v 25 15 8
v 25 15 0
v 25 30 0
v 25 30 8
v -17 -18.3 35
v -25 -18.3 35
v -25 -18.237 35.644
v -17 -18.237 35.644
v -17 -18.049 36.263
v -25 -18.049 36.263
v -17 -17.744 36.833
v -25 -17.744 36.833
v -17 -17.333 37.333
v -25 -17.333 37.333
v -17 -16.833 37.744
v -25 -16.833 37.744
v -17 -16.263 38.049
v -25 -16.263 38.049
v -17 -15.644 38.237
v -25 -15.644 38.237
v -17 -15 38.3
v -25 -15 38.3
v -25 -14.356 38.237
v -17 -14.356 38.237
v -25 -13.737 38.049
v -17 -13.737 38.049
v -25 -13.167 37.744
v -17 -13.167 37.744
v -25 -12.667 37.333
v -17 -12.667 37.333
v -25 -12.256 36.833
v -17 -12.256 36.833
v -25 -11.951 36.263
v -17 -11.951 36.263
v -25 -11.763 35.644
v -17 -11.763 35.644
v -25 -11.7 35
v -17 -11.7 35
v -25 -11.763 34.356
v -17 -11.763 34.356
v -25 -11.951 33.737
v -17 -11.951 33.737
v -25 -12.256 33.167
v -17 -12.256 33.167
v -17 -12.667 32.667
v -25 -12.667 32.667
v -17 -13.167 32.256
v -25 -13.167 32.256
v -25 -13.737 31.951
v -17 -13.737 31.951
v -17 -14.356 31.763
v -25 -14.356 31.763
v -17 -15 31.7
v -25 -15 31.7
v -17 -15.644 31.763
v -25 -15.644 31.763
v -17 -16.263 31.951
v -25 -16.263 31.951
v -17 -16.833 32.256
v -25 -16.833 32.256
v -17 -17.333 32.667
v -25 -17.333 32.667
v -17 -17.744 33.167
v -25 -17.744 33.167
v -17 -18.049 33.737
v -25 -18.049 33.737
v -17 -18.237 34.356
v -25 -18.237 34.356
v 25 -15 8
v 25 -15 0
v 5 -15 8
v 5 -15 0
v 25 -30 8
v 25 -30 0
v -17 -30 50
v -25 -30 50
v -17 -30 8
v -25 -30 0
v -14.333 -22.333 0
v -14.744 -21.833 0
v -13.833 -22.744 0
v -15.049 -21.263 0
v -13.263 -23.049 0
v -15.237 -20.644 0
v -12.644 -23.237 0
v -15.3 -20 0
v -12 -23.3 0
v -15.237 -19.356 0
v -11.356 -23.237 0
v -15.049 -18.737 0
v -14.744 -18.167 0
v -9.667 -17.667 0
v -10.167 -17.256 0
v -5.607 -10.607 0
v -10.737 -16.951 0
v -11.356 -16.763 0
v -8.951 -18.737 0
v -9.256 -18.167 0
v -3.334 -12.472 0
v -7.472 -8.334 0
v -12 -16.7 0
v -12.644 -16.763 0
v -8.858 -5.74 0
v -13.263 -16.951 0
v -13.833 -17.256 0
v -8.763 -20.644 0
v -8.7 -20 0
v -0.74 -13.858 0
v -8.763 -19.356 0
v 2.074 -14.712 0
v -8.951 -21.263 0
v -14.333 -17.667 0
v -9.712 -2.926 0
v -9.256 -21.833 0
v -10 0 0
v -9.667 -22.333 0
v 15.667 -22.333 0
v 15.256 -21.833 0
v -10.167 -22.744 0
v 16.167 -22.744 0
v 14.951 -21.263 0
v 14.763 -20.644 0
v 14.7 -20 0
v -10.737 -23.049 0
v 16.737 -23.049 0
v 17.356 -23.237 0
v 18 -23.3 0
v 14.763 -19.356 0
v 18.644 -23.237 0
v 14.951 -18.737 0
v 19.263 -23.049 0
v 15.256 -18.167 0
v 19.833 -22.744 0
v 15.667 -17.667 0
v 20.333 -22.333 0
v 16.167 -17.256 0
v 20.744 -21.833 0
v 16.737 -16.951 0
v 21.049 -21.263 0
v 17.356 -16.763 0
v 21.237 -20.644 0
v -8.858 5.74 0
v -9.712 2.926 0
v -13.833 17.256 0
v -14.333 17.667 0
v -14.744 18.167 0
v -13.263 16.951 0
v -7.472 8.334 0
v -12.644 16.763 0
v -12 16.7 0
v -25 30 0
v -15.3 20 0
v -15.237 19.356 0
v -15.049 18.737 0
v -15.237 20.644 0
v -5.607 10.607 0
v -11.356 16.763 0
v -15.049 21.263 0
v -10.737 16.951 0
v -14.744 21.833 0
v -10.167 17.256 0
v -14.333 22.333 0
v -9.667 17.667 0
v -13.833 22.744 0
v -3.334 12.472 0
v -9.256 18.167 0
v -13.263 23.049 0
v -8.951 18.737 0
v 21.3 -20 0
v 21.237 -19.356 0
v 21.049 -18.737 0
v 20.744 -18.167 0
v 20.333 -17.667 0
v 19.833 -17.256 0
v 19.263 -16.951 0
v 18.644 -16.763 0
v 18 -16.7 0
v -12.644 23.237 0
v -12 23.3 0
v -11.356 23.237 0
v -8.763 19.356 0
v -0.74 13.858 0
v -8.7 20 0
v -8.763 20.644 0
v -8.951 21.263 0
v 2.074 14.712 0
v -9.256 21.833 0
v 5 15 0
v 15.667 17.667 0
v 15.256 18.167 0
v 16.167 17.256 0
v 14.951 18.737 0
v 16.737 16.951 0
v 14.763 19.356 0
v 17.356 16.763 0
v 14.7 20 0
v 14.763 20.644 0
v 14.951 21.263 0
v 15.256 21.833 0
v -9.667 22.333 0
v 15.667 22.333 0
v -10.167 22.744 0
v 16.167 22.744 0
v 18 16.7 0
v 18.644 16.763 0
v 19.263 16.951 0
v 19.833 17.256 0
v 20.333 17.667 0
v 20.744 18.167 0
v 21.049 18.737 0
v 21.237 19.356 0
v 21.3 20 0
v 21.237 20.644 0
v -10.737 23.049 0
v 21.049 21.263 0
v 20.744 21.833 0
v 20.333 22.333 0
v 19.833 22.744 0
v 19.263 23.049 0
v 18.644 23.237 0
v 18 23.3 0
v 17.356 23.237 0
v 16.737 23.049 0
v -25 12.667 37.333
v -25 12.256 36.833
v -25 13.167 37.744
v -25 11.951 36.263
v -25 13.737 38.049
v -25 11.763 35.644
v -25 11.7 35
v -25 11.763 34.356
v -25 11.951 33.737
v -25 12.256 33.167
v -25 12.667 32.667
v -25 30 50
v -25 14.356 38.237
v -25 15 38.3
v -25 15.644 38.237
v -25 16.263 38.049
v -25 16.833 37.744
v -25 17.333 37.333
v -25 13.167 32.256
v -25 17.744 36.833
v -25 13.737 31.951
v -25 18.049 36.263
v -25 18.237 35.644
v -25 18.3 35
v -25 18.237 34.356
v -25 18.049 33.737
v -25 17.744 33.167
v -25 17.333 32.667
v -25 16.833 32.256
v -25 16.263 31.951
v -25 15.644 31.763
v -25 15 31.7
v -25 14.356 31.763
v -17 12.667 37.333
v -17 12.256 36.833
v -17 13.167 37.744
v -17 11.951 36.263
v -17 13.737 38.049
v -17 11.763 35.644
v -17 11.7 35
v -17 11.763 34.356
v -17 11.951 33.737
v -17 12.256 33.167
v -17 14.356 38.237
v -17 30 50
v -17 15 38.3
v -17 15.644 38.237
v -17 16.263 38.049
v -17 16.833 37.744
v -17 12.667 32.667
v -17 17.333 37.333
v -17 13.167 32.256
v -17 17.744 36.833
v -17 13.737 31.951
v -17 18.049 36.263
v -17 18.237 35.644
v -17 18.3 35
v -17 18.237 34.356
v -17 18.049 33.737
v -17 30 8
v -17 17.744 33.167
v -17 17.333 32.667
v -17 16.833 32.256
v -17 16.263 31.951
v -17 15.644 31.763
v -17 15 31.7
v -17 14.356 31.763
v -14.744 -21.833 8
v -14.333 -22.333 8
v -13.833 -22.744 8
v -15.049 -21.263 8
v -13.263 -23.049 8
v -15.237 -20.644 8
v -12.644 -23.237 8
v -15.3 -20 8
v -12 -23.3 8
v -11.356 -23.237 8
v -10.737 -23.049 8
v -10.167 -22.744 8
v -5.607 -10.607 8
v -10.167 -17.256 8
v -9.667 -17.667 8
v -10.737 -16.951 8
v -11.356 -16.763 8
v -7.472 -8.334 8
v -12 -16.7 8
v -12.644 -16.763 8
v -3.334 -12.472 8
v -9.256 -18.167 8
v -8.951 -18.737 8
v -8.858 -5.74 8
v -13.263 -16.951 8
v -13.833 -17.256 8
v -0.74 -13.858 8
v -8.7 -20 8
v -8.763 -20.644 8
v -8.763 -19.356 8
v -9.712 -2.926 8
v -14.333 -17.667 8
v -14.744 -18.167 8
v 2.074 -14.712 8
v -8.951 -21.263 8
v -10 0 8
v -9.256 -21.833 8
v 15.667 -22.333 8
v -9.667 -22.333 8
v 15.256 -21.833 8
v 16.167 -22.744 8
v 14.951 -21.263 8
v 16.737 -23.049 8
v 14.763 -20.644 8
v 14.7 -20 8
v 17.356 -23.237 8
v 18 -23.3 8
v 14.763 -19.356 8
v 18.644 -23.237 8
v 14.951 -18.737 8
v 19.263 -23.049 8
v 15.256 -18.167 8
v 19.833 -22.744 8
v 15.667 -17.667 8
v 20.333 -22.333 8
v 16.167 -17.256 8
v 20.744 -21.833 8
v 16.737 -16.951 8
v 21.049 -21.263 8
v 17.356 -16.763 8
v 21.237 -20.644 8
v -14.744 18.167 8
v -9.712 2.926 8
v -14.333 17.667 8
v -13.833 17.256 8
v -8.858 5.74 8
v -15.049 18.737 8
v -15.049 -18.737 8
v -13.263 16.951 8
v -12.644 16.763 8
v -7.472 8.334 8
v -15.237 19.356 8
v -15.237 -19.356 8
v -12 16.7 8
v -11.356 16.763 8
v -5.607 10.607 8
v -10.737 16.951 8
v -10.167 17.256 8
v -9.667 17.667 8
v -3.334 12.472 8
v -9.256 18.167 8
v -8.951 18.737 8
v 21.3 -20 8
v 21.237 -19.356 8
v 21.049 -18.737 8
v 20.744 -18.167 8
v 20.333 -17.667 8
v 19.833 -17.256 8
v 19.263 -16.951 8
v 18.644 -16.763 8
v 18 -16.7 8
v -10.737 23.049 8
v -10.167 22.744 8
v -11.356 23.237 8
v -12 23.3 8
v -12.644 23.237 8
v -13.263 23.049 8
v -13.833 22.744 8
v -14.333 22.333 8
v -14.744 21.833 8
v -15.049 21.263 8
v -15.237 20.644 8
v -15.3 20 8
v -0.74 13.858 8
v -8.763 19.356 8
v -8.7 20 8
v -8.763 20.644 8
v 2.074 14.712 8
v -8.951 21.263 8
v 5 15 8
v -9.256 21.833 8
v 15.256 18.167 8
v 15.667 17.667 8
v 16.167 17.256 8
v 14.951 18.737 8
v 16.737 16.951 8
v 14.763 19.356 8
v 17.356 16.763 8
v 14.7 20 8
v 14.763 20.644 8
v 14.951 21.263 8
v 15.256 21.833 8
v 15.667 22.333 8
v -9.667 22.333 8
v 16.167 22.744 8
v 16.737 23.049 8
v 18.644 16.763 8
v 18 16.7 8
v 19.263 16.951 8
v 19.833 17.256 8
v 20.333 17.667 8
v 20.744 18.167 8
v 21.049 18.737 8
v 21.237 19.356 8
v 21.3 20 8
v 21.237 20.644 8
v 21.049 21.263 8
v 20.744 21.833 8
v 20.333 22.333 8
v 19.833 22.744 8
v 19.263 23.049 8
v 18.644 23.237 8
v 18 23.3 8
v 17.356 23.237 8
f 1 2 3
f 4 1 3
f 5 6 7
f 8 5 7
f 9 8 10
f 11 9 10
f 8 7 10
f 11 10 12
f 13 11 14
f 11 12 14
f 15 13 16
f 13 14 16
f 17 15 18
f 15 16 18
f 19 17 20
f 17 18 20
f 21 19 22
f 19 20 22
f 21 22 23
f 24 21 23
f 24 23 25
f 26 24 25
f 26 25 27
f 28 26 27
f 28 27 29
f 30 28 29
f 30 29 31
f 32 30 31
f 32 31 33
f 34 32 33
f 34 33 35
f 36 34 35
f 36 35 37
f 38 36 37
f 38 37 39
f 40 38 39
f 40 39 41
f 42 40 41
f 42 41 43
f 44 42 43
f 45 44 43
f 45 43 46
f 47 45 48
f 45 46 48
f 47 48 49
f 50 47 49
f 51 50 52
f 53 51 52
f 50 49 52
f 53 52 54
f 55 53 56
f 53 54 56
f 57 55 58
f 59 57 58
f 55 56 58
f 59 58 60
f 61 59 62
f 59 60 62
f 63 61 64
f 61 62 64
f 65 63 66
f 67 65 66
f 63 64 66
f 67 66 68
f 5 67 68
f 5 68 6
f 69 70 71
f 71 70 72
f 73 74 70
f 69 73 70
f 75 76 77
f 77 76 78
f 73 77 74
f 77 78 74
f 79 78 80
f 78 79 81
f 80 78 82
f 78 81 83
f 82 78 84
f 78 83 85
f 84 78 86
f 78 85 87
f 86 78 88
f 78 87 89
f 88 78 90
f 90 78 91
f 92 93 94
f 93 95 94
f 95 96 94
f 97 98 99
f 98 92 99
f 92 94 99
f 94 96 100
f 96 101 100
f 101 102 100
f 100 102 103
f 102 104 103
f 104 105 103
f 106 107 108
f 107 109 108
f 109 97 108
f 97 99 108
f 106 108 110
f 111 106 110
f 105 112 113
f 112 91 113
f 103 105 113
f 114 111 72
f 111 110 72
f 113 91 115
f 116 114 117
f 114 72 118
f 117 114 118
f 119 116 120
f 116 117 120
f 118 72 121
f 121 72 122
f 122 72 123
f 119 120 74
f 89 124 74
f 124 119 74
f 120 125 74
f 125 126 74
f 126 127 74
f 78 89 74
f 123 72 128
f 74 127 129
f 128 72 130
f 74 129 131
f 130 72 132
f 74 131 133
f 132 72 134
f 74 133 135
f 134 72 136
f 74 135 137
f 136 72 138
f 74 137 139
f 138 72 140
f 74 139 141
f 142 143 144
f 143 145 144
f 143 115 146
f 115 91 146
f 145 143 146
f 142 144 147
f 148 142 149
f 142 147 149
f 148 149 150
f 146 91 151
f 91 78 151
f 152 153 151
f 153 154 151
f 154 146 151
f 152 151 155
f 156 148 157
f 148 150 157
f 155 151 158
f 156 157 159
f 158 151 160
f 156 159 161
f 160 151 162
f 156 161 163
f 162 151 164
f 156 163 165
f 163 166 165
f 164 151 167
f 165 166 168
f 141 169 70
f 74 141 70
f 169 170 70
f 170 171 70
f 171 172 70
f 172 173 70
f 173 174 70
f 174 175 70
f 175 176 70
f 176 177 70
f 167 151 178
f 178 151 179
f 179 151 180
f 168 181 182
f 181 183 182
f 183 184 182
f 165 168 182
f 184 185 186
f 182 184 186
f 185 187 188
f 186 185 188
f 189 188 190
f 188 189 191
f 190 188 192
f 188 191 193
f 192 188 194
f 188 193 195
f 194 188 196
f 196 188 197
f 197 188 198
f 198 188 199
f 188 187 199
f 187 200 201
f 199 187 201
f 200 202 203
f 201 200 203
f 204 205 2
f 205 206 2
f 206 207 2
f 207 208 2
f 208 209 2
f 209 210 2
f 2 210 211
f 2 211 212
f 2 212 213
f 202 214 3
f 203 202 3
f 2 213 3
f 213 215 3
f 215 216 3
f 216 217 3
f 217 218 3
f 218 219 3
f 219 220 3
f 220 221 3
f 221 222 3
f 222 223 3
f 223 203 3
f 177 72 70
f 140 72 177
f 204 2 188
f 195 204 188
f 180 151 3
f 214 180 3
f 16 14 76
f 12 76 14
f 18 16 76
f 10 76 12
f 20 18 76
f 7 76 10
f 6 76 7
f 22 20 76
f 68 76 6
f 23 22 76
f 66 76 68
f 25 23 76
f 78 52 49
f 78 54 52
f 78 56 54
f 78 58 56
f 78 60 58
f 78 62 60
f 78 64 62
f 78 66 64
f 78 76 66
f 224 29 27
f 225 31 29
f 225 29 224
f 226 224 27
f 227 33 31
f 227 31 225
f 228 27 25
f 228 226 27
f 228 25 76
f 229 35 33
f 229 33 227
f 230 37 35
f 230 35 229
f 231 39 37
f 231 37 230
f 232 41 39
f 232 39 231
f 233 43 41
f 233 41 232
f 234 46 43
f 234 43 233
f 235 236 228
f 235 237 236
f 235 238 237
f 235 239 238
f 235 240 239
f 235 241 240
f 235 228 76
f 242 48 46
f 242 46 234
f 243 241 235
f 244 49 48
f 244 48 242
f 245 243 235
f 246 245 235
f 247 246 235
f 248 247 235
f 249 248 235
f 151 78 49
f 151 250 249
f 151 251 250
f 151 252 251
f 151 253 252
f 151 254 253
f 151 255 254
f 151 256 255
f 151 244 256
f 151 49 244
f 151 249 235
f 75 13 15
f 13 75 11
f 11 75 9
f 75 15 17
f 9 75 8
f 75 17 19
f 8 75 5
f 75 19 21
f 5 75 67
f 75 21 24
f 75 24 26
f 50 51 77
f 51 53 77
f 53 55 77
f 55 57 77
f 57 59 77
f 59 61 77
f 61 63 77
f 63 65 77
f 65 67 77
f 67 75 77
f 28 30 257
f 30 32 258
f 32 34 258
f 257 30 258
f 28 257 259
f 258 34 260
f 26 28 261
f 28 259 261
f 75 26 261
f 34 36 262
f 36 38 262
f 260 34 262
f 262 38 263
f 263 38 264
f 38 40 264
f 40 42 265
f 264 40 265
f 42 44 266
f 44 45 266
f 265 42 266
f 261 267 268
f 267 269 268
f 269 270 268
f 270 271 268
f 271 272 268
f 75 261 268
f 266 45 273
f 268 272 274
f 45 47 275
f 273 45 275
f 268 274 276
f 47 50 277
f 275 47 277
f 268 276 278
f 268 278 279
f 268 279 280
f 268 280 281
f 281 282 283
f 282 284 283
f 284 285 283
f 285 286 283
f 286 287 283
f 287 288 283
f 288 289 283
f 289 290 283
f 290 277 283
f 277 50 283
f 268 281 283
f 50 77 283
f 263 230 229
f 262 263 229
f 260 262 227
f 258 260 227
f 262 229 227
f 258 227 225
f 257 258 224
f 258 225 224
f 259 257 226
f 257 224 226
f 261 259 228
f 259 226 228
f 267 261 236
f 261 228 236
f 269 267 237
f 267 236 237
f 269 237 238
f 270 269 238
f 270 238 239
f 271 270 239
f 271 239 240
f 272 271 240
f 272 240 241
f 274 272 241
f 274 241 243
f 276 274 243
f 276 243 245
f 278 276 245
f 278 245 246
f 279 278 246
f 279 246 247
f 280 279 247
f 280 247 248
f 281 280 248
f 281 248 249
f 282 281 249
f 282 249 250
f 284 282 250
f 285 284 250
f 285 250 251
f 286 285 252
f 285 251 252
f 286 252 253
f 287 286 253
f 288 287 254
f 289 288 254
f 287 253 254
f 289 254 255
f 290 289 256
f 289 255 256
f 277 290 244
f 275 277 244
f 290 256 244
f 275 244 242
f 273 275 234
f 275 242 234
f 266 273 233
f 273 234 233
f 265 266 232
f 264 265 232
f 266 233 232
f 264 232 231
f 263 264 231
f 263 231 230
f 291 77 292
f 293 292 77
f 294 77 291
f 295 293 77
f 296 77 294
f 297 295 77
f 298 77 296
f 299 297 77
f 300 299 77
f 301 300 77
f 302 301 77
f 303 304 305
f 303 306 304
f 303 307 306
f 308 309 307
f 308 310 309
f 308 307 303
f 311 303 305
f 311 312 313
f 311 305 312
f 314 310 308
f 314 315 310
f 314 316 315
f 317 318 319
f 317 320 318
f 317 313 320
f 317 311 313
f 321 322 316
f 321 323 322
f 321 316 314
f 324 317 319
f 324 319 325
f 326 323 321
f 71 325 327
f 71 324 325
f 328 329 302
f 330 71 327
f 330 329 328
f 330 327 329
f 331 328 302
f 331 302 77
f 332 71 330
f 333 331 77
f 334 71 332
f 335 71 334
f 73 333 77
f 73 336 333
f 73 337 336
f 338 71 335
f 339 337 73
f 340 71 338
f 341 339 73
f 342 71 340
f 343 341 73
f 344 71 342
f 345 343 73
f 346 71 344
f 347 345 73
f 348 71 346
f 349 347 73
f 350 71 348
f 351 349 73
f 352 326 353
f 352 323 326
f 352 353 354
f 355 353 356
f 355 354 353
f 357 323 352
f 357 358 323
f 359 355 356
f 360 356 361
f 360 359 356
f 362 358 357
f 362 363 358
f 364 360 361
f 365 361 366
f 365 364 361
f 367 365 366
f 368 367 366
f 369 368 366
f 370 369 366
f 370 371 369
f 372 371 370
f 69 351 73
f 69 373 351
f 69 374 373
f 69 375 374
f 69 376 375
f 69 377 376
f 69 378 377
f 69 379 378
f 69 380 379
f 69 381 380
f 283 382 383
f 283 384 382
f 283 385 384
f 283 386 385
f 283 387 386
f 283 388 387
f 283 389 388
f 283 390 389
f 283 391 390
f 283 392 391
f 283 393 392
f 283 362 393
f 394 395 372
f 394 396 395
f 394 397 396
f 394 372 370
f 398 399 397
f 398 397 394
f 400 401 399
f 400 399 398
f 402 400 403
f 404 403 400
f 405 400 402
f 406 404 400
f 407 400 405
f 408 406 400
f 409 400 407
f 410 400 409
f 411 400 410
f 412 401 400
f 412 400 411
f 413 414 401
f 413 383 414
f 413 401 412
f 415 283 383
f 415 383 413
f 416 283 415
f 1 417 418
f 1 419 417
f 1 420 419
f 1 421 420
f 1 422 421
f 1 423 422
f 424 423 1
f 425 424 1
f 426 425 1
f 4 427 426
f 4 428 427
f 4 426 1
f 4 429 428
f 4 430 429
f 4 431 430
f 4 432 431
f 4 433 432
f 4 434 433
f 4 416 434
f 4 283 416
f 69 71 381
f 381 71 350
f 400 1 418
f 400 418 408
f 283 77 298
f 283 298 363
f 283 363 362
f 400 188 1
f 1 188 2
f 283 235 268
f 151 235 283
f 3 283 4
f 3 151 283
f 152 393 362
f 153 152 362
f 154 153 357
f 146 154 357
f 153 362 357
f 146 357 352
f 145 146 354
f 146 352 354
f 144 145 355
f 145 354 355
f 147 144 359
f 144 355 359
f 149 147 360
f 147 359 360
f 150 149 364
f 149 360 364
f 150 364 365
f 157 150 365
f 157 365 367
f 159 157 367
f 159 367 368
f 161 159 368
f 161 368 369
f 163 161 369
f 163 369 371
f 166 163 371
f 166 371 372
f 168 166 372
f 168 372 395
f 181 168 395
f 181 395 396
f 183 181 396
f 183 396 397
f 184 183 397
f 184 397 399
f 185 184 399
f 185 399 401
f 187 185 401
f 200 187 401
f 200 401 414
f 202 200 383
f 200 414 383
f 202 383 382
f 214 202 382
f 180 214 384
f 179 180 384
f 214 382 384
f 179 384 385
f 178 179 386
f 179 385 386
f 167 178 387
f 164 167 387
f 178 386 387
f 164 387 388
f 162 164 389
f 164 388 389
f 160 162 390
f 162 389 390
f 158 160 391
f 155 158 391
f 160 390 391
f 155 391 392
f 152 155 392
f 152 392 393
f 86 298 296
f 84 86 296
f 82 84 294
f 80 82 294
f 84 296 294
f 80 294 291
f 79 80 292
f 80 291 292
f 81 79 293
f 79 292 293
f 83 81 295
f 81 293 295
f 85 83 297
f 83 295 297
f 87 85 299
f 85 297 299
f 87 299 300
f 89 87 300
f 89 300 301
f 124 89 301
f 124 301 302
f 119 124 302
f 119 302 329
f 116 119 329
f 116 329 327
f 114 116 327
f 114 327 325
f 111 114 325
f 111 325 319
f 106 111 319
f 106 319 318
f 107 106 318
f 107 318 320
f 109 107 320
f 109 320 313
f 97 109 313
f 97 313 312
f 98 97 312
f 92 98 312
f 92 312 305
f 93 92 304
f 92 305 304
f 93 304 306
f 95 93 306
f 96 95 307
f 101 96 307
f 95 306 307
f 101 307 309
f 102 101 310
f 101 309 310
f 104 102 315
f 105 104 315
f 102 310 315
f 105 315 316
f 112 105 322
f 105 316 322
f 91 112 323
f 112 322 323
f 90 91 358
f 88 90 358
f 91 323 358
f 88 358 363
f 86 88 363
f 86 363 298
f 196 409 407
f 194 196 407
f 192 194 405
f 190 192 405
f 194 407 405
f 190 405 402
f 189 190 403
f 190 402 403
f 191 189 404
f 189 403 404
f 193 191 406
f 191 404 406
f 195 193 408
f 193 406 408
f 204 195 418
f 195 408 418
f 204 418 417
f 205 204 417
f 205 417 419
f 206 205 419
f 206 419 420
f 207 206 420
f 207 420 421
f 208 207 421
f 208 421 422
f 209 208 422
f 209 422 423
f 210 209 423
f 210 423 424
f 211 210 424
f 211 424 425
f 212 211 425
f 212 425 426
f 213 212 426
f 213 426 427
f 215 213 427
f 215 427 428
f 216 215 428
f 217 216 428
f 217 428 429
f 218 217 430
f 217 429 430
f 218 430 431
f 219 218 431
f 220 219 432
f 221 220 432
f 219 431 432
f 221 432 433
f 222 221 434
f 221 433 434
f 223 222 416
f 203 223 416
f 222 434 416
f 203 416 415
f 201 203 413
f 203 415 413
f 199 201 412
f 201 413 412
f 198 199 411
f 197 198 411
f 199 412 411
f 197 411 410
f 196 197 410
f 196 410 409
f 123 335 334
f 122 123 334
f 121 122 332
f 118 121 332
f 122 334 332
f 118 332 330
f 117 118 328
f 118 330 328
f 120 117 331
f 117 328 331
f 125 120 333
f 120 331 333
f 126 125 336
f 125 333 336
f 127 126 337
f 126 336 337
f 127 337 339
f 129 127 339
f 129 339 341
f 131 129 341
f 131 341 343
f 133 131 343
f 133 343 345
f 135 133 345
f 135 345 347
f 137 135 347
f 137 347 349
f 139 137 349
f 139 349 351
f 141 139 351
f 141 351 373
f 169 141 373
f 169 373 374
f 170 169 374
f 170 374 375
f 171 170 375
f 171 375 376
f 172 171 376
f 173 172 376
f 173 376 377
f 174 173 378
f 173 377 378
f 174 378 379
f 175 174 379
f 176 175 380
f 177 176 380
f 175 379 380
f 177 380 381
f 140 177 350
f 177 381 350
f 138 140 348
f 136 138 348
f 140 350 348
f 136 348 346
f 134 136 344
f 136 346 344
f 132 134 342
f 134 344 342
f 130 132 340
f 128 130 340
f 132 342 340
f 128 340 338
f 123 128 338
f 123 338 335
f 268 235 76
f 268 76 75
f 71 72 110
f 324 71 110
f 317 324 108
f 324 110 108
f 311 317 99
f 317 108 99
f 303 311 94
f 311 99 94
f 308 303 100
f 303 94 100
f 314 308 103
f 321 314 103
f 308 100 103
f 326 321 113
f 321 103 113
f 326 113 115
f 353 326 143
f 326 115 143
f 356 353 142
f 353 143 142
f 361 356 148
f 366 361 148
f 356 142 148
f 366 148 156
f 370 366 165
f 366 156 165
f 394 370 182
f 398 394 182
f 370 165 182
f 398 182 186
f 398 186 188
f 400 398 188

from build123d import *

# Parameters (mm, degrees)
F1_DEPTH = 8
F0_W     = 8
F0_H     = 60
F2_DEPTH = 50
F4_D     = 6.6
F4_DEPTH = 17.25
F4_TIP   = 1.9828400428
F5_D     = 6.6
F5_DEPTH = 17.25
F5_TIP   = 1.9828400428


with BuildPart() as f1:
    # F0 (on Top) → F1 (new body)
    with BuildSketch(Plane.XY):
        with BuildLine():
            Line((-17, -30), (25, -30))
            Line((25, -30), (25, -15))
            Line((25, -15), (5, -15))
            ThreePointArc((5, -15), (-10, 0), (5, 15))
            Line((5, 15), (25, 15))
            Line((25, 15), (25, 30))
            Line((25, 30), (-17, 30))
            Line((-17, 30), (-17, -30))
        make_face()
    extrude(amount=F1_DEPTH)

    # F0 (on Top) → F2 (join)
    with BuildSketch(Plane.XY):
        with Locations((-21, 0)):
            Rectangle(F0_W, F0_H)
    extrude(amount=F2_DEPTH)

    # F4
    with Locations(Plane(origin=(0, 0, 0), x_dir=(1, 0, 0), z_dir=(0, 0, -1))):
        with Locations((18, 20), (-12, 20), (18, -20), (-12, -20)):
            Hole(F4_D / 2, depth=F4_DEPTH)
            with Locations((0, 0, -(F4_DEPTH + F4_TIP / 2))):  # 118° drill point
                Cone(0, F4_D / 2, F4_TIP, mode=Mode.SUBTRACT)

    # F5
    with Locations(Plane.YZ.offset(-17)):
        with Locations((-15, 35), (15, 35)):
            Hole(F5_D / 2, depth=F5_DEPTH)
            with Locations((0, 0, -(F5_DEPTH + F5_TIP / 2))):  # 118° drill point
                Cone(0, F5_D / 2, F5_TIP, mode=Mode.SUBTRACT)


solid = f1.part
